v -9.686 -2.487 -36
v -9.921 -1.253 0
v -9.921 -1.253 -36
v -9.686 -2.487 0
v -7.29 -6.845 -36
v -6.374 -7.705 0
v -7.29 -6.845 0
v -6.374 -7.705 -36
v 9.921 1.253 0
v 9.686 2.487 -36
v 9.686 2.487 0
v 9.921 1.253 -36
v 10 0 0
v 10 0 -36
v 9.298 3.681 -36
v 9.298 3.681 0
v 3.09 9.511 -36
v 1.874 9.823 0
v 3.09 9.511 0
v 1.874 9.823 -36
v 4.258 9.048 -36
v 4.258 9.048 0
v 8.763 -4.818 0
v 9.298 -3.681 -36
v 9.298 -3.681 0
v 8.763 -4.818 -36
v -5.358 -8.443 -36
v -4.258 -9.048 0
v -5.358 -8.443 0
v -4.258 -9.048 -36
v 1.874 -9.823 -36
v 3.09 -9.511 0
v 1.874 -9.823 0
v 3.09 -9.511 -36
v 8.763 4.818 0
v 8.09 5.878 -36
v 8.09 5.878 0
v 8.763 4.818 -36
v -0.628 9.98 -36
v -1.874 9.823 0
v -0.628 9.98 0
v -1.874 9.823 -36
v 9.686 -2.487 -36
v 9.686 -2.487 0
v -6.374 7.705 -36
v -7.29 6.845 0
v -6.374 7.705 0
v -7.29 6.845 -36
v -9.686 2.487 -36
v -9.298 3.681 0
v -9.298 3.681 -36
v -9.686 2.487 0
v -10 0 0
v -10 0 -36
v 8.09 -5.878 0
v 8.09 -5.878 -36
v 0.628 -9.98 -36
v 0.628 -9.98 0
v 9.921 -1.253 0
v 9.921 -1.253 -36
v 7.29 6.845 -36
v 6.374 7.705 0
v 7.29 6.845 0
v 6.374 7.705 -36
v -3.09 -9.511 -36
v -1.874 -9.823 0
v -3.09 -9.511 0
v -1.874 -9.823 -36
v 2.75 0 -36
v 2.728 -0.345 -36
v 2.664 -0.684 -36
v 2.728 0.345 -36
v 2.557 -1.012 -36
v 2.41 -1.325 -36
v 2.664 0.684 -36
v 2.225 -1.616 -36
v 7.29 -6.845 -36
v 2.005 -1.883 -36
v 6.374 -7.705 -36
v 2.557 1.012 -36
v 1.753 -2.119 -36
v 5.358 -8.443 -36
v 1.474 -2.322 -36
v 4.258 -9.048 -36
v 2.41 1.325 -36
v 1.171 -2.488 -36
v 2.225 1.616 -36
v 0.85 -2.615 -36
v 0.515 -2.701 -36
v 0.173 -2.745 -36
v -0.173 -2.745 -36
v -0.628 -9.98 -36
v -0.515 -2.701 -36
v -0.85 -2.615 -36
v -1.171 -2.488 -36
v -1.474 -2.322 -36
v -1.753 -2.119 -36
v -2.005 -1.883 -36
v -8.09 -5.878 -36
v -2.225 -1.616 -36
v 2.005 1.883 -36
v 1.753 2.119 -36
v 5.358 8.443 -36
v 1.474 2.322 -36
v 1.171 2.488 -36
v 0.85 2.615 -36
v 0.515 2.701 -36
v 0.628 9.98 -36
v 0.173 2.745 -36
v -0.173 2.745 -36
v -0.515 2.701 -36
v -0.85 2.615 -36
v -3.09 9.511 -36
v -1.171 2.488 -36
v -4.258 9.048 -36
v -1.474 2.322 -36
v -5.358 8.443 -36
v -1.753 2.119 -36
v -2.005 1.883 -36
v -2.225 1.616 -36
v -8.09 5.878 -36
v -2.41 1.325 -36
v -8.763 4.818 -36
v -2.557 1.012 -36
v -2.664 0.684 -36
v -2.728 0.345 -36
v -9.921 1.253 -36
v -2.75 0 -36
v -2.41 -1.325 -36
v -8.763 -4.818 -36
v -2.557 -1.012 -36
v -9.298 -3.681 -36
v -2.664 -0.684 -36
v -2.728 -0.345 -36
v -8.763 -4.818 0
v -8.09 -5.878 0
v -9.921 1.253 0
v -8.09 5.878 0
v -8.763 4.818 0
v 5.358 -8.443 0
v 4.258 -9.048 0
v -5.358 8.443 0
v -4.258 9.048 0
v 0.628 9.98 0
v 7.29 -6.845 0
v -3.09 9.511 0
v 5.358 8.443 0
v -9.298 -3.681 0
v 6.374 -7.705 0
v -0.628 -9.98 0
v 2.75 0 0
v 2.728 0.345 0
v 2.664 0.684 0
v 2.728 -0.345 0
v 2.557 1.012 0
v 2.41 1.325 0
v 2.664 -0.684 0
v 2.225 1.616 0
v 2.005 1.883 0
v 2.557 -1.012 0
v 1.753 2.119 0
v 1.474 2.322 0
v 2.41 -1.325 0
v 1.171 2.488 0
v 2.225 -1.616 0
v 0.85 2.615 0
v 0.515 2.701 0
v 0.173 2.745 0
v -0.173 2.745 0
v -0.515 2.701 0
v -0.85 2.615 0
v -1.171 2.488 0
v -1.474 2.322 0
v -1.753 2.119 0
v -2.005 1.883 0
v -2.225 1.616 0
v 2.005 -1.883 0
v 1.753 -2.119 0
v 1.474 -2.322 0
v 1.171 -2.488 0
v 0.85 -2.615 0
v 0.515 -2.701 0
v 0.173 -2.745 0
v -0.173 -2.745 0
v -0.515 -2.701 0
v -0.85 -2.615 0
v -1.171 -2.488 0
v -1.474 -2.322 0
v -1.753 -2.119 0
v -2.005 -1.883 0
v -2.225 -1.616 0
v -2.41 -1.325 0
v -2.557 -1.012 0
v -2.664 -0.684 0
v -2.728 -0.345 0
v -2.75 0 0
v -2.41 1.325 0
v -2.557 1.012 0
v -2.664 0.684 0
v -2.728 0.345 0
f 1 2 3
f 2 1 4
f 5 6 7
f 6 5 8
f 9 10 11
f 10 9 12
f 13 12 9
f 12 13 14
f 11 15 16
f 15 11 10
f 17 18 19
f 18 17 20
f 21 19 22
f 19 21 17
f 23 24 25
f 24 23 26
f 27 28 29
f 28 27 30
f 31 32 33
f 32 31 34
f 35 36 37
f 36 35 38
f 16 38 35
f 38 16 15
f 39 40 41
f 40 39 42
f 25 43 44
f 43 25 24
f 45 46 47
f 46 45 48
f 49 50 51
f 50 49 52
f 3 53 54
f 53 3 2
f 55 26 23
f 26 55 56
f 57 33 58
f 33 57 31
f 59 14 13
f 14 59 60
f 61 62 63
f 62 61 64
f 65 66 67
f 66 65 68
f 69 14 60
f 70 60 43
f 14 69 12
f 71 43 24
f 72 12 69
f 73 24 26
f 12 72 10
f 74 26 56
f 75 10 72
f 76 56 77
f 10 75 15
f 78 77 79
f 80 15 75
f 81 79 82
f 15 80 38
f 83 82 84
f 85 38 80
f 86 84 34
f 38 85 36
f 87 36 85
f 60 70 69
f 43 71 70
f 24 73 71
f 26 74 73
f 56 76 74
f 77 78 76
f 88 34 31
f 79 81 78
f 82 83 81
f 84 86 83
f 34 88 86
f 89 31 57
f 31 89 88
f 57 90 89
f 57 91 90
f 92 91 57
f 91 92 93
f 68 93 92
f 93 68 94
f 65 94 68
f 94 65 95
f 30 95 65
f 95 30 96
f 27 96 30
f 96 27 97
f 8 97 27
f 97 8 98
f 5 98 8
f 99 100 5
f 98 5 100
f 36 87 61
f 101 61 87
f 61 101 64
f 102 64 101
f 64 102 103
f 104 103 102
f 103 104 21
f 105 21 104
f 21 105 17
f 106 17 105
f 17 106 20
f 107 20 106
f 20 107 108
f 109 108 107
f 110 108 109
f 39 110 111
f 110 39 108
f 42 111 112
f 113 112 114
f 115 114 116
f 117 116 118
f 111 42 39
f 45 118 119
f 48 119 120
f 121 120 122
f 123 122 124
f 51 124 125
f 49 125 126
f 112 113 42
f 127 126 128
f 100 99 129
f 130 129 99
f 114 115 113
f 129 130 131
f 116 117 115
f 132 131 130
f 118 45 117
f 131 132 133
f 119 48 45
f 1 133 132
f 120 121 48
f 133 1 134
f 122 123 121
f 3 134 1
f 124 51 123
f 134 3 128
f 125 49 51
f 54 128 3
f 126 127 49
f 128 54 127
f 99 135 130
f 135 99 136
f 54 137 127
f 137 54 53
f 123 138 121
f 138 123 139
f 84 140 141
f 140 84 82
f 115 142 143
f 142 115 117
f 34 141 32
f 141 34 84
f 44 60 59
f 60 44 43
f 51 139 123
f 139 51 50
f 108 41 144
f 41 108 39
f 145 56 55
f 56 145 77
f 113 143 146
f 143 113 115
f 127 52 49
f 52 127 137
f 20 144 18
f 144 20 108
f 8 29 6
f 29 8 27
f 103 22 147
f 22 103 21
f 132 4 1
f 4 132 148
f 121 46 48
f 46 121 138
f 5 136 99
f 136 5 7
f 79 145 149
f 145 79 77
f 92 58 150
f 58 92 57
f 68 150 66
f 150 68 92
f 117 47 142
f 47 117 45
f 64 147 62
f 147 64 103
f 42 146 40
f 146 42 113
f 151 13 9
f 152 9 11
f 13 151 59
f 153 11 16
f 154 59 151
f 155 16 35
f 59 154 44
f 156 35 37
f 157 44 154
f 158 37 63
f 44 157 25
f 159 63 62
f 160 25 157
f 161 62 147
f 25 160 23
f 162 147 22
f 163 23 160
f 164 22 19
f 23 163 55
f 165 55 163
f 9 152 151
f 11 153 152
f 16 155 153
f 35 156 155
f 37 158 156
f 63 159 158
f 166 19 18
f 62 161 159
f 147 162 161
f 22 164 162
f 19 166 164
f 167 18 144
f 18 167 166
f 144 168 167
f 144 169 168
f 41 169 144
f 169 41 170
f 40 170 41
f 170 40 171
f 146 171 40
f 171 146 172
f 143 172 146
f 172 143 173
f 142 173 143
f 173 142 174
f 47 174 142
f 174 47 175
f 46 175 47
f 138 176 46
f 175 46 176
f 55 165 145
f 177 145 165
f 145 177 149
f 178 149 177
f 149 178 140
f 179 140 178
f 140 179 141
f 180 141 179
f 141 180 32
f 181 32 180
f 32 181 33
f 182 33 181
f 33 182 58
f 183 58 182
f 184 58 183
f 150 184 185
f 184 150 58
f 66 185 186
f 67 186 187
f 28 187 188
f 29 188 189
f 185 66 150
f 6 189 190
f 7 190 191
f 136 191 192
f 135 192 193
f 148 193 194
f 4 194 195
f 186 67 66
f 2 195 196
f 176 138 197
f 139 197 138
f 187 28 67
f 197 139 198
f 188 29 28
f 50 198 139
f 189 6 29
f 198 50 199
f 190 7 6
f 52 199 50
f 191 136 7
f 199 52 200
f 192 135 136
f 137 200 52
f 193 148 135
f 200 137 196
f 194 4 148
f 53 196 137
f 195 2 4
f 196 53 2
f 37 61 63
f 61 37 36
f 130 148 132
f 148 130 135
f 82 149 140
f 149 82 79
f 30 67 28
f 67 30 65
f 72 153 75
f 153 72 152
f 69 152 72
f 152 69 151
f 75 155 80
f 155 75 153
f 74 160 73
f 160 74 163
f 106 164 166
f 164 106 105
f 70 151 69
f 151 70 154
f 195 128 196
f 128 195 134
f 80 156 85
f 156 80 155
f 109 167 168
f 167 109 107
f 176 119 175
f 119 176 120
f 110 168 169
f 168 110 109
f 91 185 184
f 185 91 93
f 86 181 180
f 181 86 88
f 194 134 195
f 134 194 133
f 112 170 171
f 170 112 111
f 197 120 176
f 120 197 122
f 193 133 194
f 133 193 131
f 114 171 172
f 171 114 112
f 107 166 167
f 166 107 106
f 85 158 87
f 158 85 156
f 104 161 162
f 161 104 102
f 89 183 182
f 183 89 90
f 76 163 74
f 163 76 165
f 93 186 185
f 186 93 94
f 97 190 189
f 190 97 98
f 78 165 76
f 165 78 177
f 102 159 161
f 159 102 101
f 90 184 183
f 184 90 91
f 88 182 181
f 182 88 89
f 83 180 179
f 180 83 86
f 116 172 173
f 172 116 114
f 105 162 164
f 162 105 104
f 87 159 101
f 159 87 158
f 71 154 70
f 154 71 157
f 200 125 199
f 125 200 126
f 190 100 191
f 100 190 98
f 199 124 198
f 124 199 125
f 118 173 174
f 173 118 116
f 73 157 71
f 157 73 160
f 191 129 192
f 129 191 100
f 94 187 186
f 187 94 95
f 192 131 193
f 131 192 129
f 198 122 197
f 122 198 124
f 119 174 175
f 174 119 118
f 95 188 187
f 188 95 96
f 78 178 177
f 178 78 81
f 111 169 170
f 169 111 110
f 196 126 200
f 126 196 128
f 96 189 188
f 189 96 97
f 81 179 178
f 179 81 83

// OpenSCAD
$fn = 50;


difference() {
	union() {
		translate(v = [0, 0, -36.0000000000]) {
			cylinder(h = 36, r = 10.0000000000);
		}
		cylinder(h = 0, r = 20.0000000000);
	}
	union() {
		#translate(v = [0, 0, -36]) {
			cylinder(h = 36, r = 2.7500000000);
		}
	}
}
